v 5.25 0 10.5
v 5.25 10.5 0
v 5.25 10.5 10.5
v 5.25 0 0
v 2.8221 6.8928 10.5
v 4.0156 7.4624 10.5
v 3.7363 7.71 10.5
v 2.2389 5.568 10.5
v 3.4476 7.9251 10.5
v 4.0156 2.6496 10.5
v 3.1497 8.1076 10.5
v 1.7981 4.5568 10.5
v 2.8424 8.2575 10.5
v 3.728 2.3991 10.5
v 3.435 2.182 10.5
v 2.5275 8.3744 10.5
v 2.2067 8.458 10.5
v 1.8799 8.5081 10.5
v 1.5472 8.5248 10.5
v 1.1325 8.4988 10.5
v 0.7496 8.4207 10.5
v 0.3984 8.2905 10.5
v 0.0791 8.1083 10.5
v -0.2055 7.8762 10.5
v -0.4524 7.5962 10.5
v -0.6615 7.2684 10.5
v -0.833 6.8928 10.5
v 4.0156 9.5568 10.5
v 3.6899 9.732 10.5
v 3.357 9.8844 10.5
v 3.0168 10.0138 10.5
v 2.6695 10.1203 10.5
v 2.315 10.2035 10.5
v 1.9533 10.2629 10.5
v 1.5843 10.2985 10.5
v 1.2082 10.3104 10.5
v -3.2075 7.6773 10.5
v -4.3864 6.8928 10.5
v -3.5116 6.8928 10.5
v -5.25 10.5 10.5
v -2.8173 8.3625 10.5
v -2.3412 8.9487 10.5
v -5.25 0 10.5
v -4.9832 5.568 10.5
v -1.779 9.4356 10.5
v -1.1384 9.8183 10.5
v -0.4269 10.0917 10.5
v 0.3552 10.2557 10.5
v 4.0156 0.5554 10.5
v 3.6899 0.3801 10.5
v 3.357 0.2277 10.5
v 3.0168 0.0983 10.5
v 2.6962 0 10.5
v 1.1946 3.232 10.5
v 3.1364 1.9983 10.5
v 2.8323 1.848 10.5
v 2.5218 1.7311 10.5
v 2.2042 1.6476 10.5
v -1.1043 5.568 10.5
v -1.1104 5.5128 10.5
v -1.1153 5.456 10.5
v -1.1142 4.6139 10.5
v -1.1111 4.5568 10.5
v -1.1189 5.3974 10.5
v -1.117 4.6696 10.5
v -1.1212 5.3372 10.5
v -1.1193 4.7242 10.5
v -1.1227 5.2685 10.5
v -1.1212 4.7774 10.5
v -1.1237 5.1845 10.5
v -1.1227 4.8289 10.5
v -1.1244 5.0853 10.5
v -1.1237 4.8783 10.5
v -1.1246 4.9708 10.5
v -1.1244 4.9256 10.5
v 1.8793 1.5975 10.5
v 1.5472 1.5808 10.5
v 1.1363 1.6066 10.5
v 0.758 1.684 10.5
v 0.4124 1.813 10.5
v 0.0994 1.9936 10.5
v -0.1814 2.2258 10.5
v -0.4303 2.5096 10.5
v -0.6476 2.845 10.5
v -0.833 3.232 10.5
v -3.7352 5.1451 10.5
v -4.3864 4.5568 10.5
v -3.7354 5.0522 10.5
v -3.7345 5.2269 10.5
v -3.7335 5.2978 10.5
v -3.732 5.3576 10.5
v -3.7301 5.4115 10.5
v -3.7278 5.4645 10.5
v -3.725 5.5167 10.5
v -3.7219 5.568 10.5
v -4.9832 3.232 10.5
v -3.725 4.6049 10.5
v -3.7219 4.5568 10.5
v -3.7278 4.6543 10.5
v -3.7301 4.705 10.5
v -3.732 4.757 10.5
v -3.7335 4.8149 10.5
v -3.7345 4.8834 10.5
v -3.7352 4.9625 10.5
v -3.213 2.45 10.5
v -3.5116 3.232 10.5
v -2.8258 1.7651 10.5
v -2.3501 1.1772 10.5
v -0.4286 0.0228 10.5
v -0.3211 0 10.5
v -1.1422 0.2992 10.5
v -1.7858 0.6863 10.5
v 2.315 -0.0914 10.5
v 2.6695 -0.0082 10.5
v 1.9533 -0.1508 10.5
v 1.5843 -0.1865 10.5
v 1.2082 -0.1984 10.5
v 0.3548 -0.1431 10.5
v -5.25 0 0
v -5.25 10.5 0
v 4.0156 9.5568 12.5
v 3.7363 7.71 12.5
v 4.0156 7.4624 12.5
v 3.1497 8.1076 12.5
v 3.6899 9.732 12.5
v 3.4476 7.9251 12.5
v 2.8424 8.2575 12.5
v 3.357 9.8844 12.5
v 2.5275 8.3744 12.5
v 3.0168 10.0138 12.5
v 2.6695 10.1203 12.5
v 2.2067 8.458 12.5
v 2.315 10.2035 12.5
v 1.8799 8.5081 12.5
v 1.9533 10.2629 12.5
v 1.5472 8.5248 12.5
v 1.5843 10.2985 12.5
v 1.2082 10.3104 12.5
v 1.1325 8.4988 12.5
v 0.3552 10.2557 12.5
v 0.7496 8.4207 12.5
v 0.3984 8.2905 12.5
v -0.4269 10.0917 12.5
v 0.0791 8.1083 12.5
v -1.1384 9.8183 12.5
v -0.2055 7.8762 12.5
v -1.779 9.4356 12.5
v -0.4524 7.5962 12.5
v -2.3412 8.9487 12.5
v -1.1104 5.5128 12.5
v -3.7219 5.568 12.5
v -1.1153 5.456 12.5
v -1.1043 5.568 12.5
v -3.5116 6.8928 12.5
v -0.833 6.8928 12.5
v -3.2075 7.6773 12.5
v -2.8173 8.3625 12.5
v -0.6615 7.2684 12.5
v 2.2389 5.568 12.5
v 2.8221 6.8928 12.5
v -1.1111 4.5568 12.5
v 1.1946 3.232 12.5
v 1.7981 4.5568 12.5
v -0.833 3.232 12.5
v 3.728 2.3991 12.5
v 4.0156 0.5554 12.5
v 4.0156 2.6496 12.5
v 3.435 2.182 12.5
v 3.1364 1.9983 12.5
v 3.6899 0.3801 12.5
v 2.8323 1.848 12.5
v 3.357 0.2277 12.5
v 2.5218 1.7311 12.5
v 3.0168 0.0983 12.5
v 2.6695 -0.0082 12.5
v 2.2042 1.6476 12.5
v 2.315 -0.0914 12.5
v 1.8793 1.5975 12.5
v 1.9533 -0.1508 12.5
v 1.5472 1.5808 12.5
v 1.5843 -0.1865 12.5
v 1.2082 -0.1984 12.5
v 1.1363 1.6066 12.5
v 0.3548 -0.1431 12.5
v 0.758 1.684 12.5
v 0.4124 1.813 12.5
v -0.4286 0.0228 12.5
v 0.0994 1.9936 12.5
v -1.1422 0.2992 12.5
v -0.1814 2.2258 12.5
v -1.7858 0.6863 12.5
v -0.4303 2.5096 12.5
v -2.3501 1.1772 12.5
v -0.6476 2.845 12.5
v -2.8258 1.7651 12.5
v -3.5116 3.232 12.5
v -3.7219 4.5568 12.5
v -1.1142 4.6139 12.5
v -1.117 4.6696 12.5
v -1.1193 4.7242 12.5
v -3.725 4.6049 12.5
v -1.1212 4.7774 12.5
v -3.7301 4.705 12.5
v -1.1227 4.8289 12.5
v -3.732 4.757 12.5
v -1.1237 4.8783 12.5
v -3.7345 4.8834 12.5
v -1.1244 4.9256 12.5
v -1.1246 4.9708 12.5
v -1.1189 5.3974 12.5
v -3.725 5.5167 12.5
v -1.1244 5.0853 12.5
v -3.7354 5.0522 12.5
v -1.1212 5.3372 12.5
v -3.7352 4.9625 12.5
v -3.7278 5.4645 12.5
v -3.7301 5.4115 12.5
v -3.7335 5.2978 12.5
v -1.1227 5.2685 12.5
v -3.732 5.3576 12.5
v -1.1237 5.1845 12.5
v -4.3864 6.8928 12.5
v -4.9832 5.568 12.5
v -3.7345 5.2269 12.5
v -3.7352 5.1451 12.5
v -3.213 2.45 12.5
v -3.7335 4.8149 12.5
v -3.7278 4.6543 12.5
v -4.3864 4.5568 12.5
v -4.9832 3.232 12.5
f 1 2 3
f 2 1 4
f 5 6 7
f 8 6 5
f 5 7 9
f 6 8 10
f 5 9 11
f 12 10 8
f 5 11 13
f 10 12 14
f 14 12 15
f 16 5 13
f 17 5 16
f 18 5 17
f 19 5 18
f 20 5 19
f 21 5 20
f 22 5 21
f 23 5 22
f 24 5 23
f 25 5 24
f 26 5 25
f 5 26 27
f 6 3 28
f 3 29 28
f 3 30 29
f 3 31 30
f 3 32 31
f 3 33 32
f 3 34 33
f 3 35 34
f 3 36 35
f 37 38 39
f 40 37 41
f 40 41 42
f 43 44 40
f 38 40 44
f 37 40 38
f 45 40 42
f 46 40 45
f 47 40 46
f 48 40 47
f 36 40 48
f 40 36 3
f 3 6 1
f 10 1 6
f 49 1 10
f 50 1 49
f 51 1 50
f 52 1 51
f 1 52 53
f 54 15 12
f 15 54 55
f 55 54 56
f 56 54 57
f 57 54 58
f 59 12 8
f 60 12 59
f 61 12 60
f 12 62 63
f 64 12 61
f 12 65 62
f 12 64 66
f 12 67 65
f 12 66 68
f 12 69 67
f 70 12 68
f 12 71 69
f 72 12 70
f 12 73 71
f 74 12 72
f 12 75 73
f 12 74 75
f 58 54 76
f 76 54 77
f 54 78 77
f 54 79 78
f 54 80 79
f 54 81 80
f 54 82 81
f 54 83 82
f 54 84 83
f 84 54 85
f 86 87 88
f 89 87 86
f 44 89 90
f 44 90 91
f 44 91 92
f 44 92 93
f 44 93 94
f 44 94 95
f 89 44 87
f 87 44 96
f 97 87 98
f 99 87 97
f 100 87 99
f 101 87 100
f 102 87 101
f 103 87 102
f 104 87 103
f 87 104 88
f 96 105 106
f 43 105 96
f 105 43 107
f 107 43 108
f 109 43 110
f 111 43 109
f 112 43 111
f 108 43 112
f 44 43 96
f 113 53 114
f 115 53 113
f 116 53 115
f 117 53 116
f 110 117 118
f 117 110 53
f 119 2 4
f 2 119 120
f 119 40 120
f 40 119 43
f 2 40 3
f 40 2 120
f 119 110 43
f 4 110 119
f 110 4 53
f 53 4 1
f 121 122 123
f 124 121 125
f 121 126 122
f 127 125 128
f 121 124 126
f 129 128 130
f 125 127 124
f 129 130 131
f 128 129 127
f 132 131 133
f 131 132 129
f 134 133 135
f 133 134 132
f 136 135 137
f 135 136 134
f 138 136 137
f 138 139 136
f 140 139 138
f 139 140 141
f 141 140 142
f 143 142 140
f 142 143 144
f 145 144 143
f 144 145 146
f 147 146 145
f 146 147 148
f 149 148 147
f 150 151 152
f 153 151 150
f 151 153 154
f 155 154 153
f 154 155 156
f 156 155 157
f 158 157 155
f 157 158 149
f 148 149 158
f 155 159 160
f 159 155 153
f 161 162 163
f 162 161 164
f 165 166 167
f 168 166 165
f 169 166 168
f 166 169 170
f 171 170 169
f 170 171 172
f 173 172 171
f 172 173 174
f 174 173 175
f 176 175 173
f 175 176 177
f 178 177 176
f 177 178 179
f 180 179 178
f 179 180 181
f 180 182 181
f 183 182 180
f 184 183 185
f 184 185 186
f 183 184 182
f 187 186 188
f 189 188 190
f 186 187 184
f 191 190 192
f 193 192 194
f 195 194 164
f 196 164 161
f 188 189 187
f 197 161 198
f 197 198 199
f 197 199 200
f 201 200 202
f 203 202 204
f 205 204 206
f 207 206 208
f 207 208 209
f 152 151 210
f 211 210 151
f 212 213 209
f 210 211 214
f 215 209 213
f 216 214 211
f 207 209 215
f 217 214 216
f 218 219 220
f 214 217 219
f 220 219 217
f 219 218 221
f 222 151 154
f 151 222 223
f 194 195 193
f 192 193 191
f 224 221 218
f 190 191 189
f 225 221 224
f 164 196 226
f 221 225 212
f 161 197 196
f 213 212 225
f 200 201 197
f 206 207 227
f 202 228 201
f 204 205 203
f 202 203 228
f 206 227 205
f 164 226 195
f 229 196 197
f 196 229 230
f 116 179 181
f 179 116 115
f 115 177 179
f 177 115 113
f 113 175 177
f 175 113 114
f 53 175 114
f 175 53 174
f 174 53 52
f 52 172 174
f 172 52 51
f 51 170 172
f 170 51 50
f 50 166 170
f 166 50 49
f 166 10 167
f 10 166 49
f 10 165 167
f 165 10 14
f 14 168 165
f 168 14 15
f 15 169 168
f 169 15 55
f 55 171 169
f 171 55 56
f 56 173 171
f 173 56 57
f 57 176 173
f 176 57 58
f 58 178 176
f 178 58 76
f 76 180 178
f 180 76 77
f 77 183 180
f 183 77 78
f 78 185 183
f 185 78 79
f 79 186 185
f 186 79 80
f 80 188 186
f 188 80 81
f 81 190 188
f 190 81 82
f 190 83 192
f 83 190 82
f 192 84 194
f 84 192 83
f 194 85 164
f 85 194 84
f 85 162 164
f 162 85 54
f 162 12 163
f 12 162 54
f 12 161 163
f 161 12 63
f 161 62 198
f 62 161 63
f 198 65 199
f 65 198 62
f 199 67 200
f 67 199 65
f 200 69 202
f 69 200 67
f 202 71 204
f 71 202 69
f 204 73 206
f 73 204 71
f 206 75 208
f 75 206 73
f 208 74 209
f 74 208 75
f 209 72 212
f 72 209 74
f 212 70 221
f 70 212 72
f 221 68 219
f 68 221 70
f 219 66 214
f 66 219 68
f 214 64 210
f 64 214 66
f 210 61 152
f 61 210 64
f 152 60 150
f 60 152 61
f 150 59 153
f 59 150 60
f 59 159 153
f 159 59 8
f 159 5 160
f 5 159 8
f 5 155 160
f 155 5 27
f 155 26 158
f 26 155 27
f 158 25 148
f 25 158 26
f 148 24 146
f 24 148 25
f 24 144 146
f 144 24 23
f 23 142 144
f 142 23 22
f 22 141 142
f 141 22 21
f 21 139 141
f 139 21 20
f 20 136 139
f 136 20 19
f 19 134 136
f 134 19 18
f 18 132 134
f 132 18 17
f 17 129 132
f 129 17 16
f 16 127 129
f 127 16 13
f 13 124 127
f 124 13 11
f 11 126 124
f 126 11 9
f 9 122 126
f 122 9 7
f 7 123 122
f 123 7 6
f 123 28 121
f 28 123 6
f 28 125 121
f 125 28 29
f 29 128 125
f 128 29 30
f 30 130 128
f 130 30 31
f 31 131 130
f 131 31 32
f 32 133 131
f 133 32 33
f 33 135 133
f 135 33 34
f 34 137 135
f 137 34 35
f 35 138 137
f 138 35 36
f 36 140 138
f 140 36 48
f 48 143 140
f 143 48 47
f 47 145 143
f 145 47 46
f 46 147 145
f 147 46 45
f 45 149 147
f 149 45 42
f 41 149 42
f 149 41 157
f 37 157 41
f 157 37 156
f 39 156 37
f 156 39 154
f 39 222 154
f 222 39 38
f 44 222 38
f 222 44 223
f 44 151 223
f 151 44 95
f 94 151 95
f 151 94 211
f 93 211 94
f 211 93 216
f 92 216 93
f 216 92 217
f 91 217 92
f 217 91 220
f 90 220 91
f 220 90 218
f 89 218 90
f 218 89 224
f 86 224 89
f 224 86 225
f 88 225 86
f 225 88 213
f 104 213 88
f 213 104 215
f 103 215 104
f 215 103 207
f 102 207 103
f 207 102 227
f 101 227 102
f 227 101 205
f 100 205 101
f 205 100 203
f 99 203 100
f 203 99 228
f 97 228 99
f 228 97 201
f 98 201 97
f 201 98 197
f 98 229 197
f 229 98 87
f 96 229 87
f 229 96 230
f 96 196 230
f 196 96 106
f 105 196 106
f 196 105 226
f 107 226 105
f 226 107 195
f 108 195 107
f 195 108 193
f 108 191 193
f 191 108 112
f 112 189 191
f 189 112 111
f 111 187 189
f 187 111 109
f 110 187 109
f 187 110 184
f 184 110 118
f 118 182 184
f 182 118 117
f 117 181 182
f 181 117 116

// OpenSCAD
font="Book Antiqua:style=Bold";
font_size = 9;
t = 2;

shop_color = "BurlyWood";
exchanging_steps = 16;

a = 10.5;

module cash_exchange_shop(char, char_color, animation, step) {
    module character() {
        color(char_color)
            linear_extrude(height=t)
                text(char, font=font, halign="center");
    }
    module shop() {
        color(shop_color)
            translate([-a/2,0,0])
                cube(a);
    }
    
    shop();
    
    translate([0,0,a])
        if (animation == "Closed") {
            color("white")
                character();
        } else if (animation == "Open") {
            character();
        } else if (animation == "Exchanging") {
            translate([0,0.57*font_size,0])
                rotate([0,0,-step/exchanging_steps * 360])
                    translate([0,-0.57*font_size,0])
                        character();
        }
}


char = "€";
char_color = "purple";
animation = "Exchanging";   // Closed, Exchanging, Open
step = 0;
cash_exchange_shop(char, char_color, animation, step);
